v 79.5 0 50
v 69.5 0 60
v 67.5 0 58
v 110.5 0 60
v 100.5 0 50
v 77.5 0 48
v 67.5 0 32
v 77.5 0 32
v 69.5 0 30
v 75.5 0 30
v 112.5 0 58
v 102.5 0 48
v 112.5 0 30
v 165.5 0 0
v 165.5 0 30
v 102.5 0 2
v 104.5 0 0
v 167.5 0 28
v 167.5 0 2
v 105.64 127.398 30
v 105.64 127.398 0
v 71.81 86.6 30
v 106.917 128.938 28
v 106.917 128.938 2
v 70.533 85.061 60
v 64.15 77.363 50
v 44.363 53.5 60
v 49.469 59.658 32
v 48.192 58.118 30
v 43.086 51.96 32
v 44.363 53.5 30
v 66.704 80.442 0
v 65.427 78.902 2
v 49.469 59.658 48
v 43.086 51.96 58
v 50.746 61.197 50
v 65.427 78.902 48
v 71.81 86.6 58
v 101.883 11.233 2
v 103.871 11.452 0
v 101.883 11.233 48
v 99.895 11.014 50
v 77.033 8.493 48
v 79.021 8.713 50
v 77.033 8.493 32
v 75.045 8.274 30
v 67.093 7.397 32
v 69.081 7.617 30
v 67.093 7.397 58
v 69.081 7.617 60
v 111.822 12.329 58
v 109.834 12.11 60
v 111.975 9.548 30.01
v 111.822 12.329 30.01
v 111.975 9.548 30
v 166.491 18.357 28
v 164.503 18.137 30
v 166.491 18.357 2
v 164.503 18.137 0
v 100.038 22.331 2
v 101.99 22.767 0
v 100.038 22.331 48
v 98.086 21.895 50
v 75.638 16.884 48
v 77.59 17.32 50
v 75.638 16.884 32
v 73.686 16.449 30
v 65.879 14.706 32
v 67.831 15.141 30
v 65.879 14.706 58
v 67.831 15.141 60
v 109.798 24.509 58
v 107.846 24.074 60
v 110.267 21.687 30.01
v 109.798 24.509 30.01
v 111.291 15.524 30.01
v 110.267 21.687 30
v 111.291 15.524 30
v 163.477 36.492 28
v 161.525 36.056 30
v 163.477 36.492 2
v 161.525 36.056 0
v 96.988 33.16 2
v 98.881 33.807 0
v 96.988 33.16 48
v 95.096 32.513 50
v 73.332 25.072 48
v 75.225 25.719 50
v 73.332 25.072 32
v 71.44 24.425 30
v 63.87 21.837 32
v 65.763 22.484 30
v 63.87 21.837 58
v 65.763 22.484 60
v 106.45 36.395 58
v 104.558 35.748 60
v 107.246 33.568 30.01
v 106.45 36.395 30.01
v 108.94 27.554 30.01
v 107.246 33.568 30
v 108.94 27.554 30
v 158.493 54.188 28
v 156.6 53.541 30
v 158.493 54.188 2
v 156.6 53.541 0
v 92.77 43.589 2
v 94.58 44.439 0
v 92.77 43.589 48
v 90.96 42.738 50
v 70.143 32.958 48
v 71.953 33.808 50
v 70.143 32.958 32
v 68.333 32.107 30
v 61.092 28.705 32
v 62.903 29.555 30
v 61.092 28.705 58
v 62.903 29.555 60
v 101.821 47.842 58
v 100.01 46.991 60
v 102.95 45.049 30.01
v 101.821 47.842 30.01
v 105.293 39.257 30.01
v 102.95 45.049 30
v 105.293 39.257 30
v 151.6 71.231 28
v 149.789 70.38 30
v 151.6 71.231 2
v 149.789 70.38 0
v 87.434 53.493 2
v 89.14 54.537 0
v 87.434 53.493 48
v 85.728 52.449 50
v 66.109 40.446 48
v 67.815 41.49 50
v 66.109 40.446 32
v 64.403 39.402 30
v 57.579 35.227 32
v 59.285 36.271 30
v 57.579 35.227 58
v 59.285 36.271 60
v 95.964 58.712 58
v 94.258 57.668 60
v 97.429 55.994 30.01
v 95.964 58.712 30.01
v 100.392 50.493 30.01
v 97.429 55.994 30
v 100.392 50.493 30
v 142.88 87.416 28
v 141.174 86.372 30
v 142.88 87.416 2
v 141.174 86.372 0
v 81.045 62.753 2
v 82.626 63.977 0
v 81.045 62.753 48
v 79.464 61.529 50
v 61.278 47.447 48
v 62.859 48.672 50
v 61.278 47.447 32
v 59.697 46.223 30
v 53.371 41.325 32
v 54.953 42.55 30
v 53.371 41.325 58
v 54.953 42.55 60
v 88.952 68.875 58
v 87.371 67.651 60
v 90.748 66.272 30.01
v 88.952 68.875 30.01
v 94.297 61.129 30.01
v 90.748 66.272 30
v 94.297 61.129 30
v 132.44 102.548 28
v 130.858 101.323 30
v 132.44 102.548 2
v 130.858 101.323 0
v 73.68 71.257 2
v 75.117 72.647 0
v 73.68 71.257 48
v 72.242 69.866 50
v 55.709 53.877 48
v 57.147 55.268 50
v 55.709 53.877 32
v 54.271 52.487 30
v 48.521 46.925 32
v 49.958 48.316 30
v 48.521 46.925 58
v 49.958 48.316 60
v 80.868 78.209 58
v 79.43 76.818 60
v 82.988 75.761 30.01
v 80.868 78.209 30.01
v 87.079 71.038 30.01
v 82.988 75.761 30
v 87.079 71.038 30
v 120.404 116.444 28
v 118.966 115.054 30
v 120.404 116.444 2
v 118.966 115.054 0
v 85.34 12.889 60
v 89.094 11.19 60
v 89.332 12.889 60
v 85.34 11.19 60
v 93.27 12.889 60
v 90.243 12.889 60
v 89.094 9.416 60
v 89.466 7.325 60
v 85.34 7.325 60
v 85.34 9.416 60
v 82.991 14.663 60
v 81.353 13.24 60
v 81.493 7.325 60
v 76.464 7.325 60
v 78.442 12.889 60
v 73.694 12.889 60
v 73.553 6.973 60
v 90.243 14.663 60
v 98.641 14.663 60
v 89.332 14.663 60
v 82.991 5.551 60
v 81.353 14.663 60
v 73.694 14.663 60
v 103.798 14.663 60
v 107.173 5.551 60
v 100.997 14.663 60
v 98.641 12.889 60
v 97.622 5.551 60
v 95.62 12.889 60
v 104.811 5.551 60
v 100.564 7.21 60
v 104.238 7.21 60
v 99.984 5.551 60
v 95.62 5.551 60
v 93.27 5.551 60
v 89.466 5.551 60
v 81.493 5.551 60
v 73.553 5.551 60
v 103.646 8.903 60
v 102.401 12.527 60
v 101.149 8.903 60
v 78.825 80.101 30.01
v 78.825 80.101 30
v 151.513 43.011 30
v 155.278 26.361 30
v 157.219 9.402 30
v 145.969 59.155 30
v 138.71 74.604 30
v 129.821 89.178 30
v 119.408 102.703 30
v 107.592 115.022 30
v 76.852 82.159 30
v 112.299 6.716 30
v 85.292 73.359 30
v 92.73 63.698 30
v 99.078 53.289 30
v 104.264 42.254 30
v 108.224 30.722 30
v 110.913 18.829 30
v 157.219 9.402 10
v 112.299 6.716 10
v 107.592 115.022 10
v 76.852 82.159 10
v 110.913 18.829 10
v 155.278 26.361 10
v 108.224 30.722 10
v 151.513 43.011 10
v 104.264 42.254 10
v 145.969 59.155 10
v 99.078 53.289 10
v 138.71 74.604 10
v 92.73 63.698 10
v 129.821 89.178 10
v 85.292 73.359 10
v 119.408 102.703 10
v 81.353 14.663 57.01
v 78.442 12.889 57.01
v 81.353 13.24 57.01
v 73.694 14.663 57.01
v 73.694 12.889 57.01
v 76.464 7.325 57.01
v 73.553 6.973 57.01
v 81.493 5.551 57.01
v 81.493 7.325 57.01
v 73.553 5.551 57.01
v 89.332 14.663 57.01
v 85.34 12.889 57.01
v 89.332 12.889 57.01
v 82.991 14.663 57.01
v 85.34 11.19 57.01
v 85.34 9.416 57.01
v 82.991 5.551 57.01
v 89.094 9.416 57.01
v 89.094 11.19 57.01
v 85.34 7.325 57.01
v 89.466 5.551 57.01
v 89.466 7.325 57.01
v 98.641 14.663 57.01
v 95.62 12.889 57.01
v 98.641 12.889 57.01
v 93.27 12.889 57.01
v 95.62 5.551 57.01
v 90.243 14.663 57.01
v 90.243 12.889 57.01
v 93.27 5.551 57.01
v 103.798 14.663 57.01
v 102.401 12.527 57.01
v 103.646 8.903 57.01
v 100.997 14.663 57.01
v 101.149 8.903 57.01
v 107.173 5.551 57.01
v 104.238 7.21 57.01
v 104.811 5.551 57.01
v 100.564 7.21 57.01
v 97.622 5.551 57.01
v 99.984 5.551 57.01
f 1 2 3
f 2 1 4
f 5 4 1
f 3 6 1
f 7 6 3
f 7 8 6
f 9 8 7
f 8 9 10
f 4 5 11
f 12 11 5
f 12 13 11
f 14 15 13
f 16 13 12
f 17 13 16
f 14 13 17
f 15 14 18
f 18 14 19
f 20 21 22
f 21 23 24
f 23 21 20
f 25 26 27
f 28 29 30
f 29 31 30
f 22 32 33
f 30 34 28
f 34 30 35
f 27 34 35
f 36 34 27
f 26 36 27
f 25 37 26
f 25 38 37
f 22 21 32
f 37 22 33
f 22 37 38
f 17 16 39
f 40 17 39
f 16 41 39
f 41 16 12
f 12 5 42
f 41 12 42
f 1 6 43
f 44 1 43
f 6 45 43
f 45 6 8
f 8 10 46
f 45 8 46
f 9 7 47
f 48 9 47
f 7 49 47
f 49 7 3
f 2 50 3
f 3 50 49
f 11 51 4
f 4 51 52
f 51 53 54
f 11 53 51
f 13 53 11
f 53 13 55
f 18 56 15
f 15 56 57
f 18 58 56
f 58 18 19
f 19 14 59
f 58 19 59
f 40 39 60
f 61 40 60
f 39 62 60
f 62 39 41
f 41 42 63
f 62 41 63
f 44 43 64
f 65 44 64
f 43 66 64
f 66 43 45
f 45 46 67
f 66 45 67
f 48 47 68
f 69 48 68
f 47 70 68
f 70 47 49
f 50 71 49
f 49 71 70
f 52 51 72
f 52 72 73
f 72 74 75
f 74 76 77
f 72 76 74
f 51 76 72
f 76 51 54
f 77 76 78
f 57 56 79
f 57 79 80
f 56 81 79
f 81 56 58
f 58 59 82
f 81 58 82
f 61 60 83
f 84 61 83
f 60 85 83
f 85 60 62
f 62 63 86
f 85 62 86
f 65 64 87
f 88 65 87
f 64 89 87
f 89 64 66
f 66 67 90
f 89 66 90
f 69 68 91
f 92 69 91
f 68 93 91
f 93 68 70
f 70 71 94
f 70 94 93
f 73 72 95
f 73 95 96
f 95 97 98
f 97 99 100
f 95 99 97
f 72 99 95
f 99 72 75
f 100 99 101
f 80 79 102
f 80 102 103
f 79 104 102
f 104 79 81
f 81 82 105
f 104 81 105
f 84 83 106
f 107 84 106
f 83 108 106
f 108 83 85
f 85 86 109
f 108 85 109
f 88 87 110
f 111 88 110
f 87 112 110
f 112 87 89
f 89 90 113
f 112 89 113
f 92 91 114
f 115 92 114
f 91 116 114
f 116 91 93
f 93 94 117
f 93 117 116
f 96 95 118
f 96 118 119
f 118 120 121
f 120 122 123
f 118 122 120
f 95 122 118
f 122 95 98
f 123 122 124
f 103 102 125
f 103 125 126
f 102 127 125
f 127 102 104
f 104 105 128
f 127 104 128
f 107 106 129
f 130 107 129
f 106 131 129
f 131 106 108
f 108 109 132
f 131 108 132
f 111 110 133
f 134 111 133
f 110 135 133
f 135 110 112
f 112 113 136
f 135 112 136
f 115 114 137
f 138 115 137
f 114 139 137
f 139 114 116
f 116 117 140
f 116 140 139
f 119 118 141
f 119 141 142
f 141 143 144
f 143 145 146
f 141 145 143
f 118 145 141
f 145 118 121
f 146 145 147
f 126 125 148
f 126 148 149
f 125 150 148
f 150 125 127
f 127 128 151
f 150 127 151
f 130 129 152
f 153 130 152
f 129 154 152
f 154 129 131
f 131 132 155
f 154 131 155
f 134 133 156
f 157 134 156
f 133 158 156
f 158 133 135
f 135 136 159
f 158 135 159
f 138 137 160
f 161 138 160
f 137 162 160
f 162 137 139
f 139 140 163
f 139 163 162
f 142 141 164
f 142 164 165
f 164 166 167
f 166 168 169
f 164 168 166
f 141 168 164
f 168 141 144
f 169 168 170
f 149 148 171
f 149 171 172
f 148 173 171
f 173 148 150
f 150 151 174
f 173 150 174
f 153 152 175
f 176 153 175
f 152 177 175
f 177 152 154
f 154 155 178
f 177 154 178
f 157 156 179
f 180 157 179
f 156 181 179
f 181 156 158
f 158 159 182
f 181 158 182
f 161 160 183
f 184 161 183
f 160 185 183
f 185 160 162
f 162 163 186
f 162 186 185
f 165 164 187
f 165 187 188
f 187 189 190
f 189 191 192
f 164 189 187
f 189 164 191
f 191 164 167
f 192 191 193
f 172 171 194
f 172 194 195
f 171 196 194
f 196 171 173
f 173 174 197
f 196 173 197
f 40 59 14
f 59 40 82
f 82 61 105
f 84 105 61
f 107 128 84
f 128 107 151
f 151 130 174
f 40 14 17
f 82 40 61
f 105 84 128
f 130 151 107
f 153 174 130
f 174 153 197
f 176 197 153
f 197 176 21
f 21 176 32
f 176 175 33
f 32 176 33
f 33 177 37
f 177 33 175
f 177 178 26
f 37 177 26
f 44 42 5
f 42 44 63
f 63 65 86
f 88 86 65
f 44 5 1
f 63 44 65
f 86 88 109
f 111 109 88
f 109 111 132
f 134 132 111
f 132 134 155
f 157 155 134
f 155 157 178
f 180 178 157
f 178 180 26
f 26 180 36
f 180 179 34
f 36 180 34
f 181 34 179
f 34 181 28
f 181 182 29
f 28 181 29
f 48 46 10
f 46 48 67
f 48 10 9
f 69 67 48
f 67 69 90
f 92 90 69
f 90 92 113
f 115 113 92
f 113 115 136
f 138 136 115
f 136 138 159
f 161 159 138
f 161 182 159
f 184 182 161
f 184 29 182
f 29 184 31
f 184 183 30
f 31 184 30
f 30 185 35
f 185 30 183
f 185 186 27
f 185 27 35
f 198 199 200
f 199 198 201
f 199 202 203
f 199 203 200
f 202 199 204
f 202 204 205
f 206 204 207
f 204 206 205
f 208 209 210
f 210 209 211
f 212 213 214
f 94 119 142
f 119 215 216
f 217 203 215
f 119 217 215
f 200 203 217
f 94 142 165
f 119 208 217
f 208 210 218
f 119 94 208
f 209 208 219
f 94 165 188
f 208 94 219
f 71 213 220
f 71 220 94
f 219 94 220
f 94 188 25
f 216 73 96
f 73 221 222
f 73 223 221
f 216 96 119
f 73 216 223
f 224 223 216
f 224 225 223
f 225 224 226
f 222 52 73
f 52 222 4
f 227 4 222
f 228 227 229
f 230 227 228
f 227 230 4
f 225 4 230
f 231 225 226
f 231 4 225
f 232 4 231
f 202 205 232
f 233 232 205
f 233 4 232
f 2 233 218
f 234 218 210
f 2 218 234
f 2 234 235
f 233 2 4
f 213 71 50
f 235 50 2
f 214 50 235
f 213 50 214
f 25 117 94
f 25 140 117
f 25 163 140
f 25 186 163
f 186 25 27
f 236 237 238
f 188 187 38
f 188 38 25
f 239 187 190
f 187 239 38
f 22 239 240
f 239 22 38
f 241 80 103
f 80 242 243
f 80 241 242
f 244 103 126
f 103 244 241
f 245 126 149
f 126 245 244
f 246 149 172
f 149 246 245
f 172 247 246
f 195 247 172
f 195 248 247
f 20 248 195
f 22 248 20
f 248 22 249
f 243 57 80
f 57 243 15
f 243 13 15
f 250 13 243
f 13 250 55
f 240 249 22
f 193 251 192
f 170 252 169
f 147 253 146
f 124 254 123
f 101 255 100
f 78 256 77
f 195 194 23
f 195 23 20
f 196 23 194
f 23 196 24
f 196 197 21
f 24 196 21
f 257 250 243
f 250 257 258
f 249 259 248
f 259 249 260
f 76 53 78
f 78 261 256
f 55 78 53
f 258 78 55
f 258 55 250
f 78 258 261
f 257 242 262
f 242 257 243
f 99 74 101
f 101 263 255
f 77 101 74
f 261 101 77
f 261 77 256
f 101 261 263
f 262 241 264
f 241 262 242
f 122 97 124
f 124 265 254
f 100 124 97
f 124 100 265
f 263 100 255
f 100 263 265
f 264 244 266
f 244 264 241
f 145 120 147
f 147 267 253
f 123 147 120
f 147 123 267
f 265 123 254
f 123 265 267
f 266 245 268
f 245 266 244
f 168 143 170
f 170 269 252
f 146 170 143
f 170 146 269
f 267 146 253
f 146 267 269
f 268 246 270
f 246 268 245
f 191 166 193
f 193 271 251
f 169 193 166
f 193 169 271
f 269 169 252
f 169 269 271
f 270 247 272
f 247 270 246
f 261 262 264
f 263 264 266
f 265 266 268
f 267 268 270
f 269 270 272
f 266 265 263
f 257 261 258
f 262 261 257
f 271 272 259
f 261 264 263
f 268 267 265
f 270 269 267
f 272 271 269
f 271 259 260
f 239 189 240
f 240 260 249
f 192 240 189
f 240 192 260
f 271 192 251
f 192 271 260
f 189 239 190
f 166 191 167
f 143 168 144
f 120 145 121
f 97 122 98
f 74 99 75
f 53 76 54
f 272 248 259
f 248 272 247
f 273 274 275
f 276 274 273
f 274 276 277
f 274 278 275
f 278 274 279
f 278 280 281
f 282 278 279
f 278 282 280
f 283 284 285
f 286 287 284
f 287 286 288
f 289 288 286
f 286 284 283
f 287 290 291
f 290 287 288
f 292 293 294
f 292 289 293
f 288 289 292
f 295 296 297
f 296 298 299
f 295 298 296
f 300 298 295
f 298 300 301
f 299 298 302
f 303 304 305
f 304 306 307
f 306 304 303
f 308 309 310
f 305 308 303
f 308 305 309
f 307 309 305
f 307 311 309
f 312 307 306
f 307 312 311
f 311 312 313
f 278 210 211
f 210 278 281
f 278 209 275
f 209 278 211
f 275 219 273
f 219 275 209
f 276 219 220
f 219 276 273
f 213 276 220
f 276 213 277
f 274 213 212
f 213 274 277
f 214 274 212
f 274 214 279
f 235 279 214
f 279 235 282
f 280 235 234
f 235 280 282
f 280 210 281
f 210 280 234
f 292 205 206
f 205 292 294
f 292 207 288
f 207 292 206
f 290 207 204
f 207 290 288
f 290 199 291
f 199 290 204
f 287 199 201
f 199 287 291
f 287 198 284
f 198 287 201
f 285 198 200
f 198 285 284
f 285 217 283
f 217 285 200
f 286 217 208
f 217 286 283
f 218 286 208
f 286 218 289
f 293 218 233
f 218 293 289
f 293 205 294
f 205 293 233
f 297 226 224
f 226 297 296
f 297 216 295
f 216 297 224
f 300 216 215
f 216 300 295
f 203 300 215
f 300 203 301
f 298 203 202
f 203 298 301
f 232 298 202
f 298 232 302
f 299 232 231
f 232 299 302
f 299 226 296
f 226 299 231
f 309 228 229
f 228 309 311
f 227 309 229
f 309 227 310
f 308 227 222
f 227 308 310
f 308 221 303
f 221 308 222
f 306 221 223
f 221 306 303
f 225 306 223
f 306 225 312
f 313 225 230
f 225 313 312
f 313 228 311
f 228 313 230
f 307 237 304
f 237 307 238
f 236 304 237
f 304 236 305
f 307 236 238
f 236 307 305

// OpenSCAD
/* [Keg Parameters] */
// Keg - Outer Diameter
KegOD = 205;
// Keg - Rim Thickness
KegRimThickness = 25;

/* [Tray Parameters] */
// Tray - Height
TrayHeight = 50;
// Tray - Material Thickness
TrayThickness = 10;

/* [Sponge] */
// Sponge - Width
SpongeWidth = 90;
// Sponge - Depth
SpongeDepth = 65;
// Sponge - Thickness
SpongeThickness = 30;

/* [Grip Parameters] */
// Grip - Height
GripHeight = 20;
// Grip - Material Thickness
GripThickness = 10;

// ###########################################

/* [Hidden] */
// Chamfers
EdgeChamfer = 2;

RenderCludge = 0.01; // Cludge to tidy up rendering interface
Pi = 3.14;
$fn = 60;

// ###########################################

// Calculations
// Keg - Outer R
KegOR = KegOD / 2;
// Keg - Inner R
KegIR = KegOR - KegRimThickness;

// Grip - Height
HookGripHeight = TrayHeight - GripHeight;

// Tray - Outer R
TrayOR = KegOR + SpongeDepth;

// SpongeHolder
SpongeHolderInside = KegOR + TrayThickness;
SpongeHolderOutside = TrayOR - TrayThickness;

// ###########################################

// Outline of drip catcher
module KegDripCatcherBody()
{
/*

 2  |IR-Th..OR+Th|  3
 ┌──────────────────┐
 │                  │
 │   ┌──────────┐   │
 │   │9        8│   │
 │   │ IR    OR │   │TrH+GrTh
 │   │          │   │
 │   │          │   │4                  5
 └───┘          │   └──────────────────┐
 1    10        │                      │
                │                      │
                │                      │SpongeTh
                │                      │
                └──────────────────────┘
               7                        6

    <-- - / + -->
   
   e.g.
   [0, 0],   // BL
   [0, 10],  // TL
   [10, 10], // TR
   [10, 0]   // BR
   
*/

   polygon
   ([
      // Grip
      [KegIR - GripThickness, (TrayHeight + GripThickness) - EdgeChamfer],    // 1 .. 2
      [(KegIR - GripThickness) + EdgeChamfer, TrayHeight + GripThickness],    // Chamf on 2
      [(KegOR + TrayThickness) - EdgeChamfer, TrayHeight + GripThickness],    // 2 .. 3
      [KegOR + TrayThickness , (TrayHeight + GripThickness) - EdgeChamfer],   // Chamf 3
      [KegOR + TrayThickness, SpongeThickness],                               // 3 .. 4
      // Spongeholder
      [TrayOR - EdgeChamfer, SpongeThickness],                                // 4 .. 5
      [TrayOR, SpongeThickness - EdgeChamfer],                                // Chamf on 5
      [TrayOR, EdgeChamfer],                                                  // 5 .. 6
      [TrayOR - EdgeChamfer, 0],                                              // Chamf on 6
      [KegOR + EdgeChamfer, 0],                                               // 6 .. 7
      [KegOR, EdgeChamfer],                                                   // Chamf on 7
      // Grip + Spongeholder
      [KegOR, TrayHeight - EdgeChamfer],                                      // 7 ..8
      [KegOR - EdgeChamfer, TrayHeight],                                      // Chamf on 8
      [KegIR + EdgeChamfer, TrayHeight],                                      // 8 .. 9
      [KegIR, TrayHeight - EdgeChamfer],                                      // Chamf on 9
      [KegIR, HookGripHeight + EdgeChamfer],                                  // 9 .. 10
      [KegIR - EdgeChamfer, HookGripHeight],                                  // Chamf on 10
      [(KegIR - GripThickness) + EdgeChamfer, HookGripHeight],                // 10 .. 1
      [KegIR - GripThickness, HookGripHeight + EdgeChamfer]                   // Chamf on 1
   ]);
}

// Outline of sponge holder
module SpongeHolder()
{
   polygon
   ([
      [SpongeHolderInside, SpongeThickness + RenderCludge],
      [SpongeHolderOutside, SpongeThickness + RenderCludge],
      [SpongeHolderOutside, TrayThickness],
      [SpongeHolderInside, TrayThickness]
   ]);
}

module CreateText(textString, size, position) {
    translate(position)
        linear_extrude(height = 3)
            text(textString, font = "Leelawadee UI:style=Bold", size = size, valign = "center", halign = "center");
}

module KegDripCatcher()
{
   // Angular step repetition out of 360deg
   AngularRepeat = (360 * SpongeWidth) / (Pi * KegOR * 2);
   // Sponge cut
   SpongeCutAngularRepeat = (360 * TrayThickness) / (Pi * TrayOR * 2);
   
   difference()
   {
      difference()
      {
         // Tray
         rotate_extrude(angle=AngularRepeat) KegDripCatcherBody();

         // SpongeHolder
         rotate([0,0,SpongeCutAngularRepeat])
            rotate_extrude(angle=AngularRepeat - (SpongeCutAngularRepeat * 2))
               SpongeHolder();

      }
      
      #CreateText("ZETA", size = 9, position = [KegOR - (KegRimThickness / 2), 10, (TrayHeight + GripThickness) - 3 + RenderCludge]);
   }
}

// ###########################################

KegDripCatcher();
